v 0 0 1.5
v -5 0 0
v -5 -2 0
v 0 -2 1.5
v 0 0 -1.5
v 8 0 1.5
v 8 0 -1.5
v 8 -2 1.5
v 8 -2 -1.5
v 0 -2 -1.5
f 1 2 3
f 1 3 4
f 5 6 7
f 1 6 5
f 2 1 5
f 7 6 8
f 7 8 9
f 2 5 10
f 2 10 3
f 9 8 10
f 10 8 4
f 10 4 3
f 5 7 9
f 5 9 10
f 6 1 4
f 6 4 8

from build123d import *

# Parameters (mm, degrees)
PAD_DEPTH = 2


with BuildPart() as part:
    # Sketch → Pad (new body)
    with BuildSketch(Plane.XZ):
        Polygon((0, 1.5), (8, 1.5), (8, -1.5), (0, -1.5), (-5, 0), align=None)
    extrude(amount=PAD_DEPTH)


solid = part.part
